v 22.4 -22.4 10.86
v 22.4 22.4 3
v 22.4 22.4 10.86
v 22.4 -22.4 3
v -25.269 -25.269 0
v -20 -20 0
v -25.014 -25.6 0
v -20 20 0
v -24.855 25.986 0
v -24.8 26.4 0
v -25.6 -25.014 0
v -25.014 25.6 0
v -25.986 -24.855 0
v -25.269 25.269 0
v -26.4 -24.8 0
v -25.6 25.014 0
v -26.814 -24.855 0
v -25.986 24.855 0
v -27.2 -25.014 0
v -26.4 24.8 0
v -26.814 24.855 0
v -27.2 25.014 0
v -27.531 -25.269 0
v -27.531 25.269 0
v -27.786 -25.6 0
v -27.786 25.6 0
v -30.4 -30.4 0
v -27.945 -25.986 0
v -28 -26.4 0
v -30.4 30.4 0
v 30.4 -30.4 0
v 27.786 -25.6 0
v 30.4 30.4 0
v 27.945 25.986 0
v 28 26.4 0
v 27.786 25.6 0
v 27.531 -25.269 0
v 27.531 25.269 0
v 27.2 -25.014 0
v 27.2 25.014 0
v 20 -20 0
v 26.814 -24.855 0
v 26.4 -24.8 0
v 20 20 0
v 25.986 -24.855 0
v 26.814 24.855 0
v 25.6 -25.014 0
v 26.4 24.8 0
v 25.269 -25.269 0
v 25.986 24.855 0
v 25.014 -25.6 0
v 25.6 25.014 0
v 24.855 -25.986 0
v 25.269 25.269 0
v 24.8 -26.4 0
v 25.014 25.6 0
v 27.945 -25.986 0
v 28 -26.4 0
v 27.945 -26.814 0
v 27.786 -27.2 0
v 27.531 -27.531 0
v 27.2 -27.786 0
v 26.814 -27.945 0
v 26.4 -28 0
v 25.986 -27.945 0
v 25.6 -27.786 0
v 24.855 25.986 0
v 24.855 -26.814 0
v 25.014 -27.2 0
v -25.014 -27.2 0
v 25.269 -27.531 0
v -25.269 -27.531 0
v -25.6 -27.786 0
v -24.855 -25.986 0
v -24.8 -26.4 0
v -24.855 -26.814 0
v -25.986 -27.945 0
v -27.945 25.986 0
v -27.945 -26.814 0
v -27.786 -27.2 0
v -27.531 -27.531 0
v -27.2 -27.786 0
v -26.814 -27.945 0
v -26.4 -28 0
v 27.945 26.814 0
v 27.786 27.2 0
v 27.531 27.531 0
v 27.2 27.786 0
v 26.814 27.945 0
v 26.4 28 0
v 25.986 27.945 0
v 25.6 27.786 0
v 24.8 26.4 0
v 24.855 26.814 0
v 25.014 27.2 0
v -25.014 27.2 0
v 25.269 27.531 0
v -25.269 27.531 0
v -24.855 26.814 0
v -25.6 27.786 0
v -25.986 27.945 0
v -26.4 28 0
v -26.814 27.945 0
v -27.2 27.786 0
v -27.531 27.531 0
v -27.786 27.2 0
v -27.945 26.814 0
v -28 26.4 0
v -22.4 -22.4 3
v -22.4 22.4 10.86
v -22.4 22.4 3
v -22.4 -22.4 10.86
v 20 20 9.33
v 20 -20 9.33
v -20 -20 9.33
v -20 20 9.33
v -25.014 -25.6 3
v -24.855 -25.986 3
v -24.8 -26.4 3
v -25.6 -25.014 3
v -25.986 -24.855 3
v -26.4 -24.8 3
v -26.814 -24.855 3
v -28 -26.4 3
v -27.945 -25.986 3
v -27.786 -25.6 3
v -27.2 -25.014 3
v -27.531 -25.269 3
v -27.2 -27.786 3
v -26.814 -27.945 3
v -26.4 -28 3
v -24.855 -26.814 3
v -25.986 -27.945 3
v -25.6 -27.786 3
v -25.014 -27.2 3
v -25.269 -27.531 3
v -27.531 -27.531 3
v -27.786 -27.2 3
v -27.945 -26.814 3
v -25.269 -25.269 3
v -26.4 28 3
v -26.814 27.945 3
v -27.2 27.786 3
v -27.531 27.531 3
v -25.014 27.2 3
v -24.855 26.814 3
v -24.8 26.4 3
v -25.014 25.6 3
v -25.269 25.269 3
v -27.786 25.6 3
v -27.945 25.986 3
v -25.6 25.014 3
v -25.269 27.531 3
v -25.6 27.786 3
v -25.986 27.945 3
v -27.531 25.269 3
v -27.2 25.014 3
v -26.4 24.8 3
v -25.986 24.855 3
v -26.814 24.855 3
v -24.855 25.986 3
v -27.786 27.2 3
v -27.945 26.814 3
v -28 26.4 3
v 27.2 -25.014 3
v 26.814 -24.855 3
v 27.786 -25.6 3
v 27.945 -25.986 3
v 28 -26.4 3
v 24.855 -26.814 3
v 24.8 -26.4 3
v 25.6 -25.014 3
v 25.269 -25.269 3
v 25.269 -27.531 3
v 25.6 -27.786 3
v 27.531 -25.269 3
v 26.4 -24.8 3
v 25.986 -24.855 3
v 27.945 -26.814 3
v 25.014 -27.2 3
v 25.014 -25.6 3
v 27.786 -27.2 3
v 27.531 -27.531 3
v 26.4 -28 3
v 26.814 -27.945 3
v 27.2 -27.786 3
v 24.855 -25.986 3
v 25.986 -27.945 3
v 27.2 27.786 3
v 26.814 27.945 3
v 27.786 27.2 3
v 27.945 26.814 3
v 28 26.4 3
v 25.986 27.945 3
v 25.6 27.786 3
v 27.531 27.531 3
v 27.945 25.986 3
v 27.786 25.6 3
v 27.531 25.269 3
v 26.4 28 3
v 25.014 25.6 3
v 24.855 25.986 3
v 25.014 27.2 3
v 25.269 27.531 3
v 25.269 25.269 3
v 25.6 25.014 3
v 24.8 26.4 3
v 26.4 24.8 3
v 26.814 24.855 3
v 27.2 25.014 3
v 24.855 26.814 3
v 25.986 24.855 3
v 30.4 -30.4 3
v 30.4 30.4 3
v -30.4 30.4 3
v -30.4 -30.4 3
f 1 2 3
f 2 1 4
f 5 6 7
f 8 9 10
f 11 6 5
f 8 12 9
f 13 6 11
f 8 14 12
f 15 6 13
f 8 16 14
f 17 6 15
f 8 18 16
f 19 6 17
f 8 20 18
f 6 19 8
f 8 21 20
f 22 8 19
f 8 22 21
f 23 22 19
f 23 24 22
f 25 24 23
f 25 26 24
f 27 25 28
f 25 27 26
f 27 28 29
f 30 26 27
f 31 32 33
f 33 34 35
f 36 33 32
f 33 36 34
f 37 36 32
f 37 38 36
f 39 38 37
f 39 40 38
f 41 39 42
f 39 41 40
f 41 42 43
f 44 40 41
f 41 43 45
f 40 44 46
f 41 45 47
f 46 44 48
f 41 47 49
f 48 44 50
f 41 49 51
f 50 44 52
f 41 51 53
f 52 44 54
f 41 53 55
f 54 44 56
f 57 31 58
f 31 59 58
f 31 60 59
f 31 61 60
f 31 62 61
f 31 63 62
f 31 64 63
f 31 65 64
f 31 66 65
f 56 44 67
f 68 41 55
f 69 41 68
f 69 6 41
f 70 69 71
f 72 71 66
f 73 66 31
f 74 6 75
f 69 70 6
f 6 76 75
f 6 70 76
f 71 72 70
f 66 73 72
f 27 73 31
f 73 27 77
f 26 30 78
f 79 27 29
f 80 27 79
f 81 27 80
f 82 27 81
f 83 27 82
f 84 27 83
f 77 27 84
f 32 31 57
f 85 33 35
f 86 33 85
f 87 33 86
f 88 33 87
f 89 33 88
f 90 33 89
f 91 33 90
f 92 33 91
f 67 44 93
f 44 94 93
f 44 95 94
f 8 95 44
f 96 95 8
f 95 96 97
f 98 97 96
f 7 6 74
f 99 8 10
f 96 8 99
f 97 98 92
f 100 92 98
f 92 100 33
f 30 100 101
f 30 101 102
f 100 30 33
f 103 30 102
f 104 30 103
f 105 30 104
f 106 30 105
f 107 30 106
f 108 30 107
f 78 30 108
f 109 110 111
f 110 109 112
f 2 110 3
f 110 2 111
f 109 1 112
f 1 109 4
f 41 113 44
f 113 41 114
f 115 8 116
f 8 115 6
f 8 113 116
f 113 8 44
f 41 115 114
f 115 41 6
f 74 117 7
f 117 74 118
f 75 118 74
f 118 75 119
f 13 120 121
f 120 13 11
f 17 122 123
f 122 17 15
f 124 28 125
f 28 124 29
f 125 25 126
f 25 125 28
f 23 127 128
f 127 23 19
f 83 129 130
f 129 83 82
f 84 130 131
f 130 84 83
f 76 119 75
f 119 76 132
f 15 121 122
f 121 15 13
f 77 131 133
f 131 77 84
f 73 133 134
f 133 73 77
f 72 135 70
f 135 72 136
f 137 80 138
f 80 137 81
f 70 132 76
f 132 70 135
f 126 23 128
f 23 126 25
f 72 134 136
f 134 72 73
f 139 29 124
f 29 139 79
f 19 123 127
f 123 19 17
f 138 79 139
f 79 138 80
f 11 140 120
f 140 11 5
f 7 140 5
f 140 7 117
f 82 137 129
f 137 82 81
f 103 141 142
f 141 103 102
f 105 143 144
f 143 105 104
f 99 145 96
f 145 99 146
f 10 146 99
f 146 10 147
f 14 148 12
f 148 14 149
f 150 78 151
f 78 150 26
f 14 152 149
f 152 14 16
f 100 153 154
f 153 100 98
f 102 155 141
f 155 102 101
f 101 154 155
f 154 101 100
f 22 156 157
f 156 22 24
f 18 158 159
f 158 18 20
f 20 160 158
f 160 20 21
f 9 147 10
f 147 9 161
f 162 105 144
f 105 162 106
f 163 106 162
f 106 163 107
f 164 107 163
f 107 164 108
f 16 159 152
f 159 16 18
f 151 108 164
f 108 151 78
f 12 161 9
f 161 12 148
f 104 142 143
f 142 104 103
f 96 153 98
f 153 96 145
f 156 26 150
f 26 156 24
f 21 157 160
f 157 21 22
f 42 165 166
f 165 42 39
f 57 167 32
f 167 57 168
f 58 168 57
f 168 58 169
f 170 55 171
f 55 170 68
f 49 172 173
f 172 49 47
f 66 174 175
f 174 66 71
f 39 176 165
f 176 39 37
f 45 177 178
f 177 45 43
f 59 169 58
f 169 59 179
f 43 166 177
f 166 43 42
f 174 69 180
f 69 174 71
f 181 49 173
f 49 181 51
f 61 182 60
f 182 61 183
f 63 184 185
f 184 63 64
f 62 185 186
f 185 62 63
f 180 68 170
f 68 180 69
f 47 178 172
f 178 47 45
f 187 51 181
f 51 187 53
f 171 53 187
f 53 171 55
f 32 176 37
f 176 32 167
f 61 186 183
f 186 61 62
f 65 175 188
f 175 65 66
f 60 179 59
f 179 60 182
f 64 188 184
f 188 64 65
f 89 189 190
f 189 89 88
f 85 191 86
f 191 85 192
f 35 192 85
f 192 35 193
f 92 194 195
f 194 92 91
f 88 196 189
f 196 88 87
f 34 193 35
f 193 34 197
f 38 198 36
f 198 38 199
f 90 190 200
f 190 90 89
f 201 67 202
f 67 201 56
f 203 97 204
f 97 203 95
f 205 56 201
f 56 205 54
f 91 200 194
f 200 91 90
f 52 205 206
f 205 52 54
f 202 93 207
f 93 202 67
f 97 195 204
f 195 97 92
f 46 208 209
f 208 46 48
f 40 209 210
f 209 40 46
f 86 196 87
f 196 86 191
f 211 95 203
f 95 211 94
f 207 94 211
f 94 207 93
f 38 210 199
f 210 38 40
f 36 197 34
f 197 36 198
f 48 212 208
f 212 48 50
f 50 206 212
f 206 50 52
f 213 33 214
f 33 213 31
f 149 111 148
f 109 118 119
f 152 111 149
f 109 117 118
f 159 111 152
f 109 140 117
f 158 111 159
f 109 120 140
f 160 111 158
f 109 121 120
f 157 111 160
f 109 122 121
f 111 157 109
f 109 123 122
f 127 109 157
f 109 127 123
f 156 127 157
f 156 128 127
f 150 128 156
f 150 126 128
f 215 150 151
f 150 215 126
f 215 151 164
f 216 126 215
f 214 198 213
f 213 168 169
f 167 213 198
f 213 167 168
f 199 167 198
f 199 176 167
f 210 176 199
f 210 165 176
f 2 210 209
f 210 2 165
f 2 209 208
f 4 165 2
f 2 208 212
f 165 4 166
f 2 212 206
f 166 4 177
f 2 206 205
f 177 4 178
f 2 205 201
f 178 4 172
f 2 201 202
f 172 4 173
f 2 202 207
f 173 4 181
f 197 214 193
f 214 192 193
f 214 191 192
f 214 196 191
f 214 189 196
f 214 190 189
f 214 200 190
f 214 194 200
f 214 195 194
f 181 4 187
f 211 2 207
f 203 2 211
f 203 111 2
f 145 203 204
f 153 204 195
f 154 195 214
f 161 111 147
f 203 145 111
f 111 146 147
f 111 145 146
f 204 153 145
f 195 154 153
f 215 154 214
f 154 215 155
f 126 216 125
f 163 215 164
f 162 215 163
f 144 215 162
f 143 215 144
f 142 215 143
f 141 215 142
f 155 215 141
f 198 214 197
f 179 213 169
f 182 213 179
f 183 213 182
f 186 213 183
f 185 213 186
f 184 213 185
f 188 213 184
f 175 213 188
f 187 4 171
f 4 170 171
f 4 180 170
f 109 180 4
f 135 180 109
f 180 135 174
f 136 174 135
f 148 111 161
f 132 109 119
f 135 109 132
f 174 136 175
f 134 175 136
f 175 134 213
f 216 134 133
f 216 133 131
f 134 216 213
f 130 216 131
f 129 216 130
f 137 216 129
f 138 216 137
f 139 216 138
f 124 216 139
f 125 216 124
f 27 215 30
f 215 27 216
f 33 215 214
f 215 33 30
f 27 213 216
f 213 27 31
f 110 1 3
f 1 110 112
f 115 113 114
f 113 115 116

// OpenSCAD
// Interchangeable IWR6843 radar front: an RF window at a set standoff and an
// asymmetric hood. Parameter names match RadarFrontParams (radome.py); take
// the window thickness from `evaluate_iwr_clutter.py radome` for the material.
// All lengths in mm, angles in degrees.

radar_window_thickness = 1.52;
radar_window_standoff = 4.84;
radar_window_width = 40;
radar_window_height = 40;
hood_left_depth = 0;
hood_right_depth = 0;
hood_top_depth = 0;
hood_bottom_depth = 0;

wall = 2.4;
frame_depth = 3;
board_clearance = 1.5;
flange = 8;
screw_d = 3.2;

outer_w = radar_window_width + 2 * wall;
outer_h = radar_window_height + 2 * wall;
body_depth = radar_window_standoff + board_clearance + frame_depth;

// The window spans the whole front so it bonds to the walls; only its
// central radar_window_width x radar_window_height is in the radar's view.
module window() {
    translate([-outer_w / 2, -outer_h / 2, body_depth - 0.01])
        cube([outer_w, outer_h, radar_window_thickness + 0.01]);
}

module body() {
    difference() {
        translate([-outer_w / 2, -outer_h / 2, 0])
            cube([outer_w, outer_h, body_depth]);
        translate([-radar_window_width / 2, -radar_window_height / 2, -1])
            cube([radar_window_width, radar_window_height, body_depth + 2]);
    }
    difference() {
        translate([-outer_w / 2 - flange, -outer_h / 2 - flange, 0])
            cube([outer_w + 2 * flange, outer_h + 2 * flange, frame_depth]);
        translate([-outer_w / 2, -outer_h / 2, -1])
            cube([outer_w, outer_h, frame_depth + 2]);
        for (x = [-1, 1], y = [-1, 1])
            translate([x * (outer_w / 2 + flange / 2), y * (outer_h / 2 + flange / 2), -1])
                cylinder(d = screw_d, h = frame_depth + 2, $fn = 24);
    }
}

// One hood wall on each side with a depth; 0 leaves that side open.
module hood() {
    z0 = body_depth + radar_window_thickness - 0.01;
    if (hood_left_depth > 0)
        translate([-outer_w / 2, -outer_h / 2, z0]) cube([wall, outer_h, hood_left_depth]);
    if (hood_right_depth > 0)
        translate([outer_w / 2 - wall, -outer_h / 2, z0]) cube([wall, outer_h, hood_right_depth]);
    if (hood_top_depth > 0)
        translate([-outer_w / 2, outer_h / 2 - wall, z0]) cube([outer_w, wall, hood_top_depth]);
    if (hood_bottom_depth > 0)
        translate([-outer_w / 2, -outer_h / 2, z0]) cube([outer_w, wall, hood_bottom_depth]);
}

union() {
    body();
    window();
    hood();
}
